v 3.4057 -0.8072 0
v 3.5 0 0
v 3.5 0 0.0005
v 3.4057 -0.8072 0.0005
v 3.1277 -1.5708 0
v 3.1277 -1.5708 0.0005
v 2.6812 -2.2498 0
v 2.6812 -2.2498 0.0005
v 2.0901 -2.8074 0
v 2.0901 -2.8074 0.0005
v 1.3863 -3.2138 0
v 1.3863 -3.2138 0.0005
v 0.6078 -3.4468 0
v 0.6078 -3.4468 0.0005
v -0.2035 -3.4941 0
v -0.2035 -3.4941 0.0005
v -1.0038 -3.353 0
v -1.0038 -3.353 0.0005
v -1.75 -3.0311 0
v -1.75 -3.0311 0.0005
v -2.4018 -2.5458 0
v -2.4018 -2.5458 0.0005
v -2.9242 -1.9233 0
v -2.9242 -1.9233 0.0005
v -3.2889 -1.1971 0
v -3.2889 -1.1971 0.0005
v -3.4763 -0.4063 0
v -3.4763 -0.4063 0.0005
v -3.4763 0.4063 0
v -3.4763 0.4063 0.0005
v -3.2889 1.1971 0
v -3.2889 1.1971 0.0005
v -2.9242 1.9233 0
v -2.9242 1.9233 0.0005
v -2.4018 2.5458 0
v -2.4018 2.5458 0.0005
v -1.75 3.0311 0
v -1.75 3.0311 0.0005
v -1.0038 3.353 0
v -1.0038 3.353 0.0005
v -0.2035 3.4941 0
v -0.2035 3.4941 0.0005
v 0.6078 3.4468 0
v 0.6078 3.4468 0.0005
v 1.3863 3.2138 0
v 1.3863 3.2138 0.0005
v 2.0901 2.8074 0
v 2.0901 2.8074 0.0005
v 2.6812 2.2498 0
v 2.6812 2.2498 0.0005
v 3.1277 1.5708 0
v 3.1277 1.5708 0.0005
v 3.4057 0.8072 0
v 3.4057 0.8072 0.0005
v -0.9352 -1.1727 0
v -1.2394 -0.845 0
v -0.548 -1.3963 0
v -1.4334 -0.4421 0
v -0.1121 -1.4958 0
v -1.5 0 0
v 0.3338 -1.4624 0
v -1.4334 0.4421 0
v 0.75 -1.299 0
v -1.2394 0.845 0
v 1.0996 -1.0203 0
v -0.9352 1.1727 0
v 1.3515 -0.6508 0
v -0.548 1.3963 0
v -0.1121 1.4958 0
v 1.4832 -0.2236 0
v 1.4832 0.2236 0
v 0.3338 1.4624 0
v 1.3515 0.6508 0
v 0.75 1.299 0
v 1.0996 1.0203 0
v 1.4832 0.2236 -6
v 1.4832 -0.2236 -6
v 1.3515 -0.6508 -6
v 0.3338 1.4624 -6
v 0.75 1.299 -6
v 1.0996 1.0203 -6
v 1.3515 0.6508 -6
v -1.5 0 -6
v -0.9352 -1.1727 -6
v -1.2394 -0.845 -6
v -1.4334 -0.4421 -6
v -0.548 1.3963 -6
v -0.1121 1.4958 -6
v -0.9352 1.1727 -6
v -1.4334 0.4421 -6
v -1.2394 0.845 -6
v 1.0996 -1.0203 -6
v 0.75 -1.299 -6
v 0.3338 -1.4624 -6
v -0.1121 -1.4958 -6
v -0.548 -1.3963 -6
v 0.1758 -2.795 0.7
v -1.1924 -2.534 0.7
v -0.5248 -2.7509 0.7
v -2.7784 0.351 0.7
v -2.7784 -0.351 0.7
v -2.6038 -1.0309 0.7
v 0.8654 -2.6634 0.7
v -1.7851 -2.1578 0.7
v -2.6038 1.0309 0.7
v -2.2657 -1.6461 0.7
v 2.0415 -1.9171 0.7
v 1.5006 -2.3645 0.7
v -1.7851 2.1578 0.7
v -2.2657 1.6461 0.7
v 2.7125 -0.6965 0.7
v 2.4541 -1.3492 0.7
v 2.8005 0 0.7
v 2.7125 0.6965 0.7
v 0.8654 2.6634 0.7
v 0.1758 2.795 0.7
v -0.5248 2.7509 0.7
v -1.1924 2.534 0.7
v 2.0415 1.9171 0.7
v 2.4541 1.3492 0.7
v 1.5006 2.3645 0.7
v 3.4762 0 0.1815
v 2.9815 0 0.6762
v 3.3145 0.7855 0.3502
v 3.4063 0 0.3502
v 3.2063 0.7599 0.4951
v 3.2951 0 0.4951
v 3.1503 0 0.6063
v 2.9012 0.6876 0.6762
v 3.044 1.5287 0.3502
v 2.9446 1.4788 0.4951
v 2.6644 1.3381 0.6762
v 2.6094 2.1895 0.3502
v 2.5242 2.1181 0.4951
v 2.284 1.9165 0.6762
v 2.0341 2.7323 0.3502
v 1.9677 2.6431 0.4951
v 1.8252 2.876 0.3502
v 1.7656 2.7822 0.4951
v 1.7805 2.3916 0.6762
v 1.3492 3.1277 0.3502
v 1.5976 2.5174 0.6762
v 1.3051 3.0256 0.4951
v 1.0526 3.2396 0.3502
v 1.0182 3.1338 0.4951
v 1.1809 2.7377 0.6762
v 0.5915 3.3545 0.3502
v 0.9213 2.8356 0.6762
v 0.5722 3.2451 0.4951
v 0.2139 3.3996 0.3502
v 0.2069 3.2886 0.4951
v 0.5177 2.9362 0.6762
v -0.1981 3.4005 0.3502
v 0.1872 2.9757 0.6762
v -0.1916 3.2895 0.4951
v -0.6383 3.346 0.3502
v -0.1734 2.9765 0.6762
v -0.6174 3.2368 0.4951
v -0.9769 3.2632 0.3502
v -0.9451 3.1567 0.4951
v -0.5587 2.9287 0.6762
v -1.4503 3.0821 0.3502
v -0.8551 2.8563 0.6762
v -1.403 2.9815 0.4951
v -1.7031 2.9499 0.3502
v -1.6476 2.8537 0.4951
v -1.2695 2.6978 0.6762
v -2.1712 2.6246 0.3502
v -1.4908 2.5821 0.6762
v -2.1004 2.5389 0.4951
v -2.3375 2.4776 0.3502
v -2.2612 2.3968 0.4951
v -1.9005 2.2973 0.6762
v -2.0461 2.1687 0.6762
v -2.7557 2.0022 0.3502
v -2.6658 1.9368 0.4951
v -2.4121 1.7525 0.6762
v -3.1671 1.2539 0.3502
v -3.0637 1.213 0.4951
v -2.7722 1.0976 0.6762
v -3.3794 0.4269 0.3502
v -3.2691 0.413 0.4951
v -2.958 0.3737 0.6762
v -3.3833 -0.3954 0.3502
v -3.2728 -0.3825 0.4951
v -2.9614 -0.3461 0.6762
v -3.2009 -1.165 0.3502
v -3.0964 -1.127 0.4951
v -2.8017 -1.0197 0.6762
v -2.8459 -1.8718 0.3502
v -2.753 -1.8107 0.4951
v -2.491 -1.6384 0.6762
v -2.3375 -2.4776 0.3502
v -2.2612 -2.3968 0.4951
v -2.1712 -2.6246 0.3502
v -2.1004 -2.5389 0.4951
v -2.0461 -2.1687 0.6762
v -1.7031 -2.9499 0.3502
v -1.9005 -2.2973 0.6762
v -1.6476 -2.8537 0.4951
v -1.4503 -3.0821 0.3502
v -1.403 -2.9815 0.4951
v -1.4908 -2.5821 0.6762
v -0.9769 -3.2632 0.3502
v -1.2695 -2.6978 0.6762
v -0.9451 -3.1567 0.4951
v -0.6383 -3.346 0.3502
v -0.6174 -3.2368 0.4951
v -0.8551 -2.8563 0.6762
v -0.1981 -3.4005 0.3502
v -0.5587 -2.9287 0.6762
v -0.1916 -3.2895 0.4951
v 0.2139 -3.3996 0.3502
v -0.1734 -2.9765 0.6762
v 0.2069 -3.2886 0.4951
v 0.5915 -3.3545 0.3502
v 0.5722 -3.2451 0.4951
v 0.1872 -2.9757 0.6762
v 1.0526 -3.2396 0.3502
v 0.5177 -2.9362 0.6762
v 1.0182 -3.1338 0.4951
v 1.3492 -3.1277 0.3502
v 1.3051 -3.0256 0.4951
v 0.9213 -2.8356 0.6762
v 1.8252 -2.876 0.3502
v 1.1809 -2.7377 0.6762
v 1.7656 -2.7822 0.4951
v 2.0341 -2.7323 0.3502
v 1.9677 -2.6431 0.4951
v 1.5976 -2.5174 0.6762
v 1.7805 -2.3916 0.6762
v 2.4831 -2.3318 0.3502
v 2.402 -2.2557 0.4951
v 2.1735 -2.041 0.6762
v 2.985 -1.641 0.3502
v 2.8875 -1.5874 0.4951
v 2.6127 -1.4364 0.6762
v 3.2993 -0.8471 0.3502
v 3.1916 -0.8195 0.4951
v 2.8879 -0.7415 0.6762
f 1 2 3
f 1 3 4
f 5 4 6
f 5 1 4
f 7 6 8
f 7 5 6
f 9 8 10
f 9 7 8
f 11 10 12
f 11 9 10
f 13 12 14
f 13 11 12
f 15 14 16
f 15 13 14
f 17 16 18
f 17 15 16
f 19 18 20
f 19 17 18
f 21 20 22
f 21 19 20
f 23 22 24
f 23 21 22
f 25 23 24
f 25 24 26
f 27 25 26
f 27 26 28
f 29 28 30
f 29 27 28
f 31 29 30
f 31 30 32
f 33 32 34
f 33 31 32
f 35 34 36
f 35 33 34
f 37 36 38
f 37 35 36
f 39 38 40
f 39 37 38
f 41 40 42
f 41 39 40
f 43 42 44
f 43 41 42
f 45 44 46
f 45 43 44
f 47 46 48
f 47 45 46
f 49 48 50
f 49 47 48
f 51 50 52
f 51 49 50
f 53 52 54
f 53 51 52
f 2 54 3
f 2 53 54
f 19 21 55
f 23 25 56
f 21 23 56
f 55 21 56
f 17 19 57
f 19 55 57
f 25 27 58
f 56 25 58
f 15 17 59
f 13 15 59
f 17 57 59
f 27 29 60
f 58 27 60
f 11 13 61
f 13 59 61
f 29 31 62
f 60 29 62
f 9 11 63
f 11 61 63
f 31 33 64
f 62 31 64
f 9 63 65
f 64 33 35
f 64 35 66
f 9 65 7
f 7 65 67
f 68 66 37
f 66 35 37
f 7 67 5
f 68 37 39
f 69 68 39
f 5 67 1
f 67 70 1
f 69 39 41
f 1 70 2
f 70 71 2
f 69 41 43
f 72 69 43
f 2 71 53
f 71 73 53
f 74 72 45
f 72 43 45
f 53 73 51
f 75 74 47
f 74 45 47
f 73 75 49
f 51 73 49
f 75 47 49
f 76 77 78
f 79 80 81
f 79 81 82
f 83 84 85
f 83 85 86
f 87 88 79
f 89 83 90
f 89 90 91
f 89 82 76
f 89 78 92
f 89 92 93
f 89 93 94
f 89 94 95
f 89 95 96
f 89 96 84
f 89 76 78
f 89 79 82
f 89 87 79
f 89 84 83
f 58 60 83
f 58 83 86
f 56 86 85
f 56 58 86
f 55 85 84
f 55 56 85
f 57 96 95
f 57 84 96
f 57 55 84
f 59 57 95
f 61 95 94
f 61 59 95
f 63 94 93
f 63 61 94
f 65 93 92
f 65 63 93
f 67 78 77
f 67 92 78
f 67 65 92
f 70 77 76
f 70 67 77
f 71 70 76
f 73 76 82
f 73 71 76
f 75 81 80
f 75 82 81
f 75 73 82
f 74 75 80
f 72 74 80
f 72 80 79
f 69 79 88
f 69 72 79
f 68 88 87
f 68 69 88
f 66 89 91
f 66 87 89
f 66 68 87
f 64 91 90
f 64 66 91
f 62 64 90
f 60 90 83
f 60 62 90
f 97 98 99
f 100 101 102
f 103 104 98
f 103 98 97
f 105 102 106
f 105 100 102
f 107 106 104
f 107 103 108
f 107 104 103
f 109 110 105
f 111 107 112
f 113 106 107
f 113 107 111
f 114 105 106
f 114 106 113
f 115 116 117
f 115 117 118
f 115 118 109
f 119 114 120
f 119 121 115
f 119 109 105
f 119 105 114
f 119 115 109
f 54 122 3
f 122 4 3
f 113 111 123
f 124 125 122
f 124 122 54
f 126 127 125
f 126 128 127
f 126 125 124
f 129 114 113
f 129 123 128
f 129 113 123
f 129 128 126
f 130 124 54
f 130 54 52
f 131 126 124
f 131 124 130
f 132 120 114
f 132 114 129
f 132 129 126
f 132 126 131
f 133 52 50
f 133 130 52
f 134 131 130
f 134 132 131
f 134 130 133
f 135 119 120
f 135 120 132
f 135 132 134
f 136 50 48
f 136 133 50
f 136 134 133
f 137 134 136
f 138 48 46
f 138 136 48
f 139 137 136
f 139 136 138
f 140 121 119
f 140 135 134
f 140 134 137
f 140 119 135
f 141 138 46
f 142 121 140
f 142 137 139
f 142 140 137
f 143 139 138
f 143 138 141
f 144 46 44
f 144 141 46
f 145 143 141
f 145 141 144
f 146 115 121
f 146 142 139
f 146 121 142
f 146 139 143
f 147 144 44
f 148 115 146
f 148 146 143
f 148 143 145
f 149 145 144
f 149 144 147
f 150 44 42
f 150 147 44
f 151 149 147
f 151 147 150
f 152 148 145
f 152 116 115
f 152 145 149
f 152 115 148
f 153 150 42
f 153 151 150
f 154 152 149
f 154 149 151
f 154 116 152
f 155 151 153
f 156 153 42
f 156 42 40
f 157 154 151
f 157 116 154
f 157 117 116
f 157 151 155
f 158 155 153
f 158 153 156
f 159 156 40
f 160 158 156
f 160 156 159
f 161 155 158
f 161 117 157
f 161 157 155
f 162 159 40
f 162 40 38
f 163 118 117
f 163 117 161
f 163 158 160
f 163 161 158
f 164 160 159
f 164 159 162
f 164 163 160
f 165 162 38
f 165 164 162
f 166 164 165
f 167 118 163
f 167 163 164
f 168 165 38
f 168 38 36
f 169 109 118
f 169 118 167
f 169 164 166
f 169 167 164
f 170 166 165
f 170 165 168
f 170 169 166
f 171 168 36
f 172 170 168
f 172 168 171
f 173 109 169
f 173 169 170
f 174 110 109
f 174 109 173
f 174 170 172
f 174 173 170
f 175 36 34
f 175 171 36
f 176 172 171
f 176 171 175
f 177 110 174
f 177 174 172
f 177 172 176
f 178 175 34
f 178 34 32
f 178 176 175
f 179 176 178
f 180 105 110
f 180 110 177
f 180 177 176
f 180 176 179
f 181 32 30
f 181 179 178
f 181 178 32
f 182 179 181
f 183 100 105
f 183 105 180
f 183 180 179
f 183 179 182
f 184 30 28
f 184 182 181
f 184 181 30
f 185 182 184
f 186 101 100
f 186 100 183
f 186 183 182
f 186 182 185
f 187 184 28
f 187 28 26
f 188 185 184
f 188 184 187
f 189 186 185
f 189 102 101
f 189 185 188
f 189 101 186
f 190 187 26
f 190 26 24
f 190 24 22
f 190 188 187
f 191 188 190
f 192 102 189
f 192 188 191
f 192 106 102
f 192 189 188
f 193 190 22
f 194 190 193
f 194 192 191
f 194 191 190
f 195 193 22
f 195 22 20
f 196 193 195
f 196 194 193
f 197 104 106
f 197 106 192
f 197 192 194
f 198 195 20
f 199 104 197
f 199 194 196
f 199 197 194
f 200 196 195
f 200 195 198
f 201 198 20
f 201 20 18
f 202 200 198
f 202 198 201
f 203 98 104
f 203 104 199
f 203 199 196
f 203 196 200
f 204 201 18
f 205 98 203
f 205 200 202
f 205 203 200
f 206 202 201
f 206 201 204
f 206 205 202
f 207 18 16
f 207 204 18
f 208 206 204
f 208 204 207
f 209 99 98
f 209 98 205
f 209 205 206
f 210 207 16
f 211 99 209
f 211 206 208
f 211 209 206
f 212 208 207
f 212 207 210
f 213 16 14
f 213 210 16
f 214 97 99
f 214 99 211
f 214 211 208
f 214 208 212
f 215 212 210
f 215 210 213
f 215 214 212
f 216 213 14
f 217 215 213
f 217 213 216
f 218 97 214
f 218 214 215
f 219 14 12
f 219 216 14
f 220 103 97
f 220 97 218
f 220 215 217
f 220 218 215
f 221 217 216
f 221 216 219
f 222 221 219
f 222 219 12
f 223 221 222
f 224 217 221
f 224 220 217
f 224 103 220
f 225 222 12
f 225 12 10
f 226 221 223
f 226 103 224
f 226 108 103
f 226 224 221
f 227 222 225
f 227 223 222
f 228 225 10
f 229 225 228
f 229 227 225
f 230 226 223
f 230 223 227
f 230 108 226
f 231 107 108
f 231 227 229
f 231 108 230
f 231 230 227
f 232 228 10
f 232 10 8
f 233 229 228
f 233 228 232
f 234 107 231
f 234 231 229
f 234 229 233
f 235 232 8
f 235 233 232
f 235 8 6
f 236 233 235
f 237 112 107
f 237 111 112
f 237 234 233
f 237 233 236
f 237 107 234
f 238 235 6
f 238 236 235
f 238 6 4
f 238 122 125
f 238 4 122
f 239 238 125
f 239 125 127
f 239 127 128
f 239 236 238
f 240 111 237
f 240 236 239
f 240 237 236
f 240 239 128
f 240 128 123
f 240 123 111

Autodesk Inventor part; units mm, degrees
ref_plane "YZ Plane" through (0, 0, 0) normal (1, 0, 0) x (0, 1, 0)
ref_plane "XZ Plane" through (0, 0, 0) normal (0, 1, 0) x (-1, 0, 0)
ref_plane "XY Plane" through (0, 0, 0) normal (0, 0, 1) x (1, 0, 0)
sketch "スケッチ1" plane through (0, 0, 0) normal (0, 0, 1) x (1, 0, 0)
  circle A0 centre (0, 0) radius 3.5
  dimension "d0" = 7
extrude "押し出し1" add sketch "スケッチ1" along normal blind 0.7
sketch "スケッチ2" plane through (0, 0, 0) normal (0, 0, -1) x (-1, 0, 0)
  circle A0 centre (0, 0) radius 1.5
  dimension "d3" = 3
extrude "押し出し2" add sketch "スケッチ2" along normal blind 6
thread "ねじ1" size "M3x0.5" class "6g" standard "ANSI Metric M Profile" full length
fillet "フィレット1" radius 0.7 1 edges at (-3.5, 0, 0.7)
properties part number "ネジ低頭m3.06" material "鋼、高強度、低合金"
